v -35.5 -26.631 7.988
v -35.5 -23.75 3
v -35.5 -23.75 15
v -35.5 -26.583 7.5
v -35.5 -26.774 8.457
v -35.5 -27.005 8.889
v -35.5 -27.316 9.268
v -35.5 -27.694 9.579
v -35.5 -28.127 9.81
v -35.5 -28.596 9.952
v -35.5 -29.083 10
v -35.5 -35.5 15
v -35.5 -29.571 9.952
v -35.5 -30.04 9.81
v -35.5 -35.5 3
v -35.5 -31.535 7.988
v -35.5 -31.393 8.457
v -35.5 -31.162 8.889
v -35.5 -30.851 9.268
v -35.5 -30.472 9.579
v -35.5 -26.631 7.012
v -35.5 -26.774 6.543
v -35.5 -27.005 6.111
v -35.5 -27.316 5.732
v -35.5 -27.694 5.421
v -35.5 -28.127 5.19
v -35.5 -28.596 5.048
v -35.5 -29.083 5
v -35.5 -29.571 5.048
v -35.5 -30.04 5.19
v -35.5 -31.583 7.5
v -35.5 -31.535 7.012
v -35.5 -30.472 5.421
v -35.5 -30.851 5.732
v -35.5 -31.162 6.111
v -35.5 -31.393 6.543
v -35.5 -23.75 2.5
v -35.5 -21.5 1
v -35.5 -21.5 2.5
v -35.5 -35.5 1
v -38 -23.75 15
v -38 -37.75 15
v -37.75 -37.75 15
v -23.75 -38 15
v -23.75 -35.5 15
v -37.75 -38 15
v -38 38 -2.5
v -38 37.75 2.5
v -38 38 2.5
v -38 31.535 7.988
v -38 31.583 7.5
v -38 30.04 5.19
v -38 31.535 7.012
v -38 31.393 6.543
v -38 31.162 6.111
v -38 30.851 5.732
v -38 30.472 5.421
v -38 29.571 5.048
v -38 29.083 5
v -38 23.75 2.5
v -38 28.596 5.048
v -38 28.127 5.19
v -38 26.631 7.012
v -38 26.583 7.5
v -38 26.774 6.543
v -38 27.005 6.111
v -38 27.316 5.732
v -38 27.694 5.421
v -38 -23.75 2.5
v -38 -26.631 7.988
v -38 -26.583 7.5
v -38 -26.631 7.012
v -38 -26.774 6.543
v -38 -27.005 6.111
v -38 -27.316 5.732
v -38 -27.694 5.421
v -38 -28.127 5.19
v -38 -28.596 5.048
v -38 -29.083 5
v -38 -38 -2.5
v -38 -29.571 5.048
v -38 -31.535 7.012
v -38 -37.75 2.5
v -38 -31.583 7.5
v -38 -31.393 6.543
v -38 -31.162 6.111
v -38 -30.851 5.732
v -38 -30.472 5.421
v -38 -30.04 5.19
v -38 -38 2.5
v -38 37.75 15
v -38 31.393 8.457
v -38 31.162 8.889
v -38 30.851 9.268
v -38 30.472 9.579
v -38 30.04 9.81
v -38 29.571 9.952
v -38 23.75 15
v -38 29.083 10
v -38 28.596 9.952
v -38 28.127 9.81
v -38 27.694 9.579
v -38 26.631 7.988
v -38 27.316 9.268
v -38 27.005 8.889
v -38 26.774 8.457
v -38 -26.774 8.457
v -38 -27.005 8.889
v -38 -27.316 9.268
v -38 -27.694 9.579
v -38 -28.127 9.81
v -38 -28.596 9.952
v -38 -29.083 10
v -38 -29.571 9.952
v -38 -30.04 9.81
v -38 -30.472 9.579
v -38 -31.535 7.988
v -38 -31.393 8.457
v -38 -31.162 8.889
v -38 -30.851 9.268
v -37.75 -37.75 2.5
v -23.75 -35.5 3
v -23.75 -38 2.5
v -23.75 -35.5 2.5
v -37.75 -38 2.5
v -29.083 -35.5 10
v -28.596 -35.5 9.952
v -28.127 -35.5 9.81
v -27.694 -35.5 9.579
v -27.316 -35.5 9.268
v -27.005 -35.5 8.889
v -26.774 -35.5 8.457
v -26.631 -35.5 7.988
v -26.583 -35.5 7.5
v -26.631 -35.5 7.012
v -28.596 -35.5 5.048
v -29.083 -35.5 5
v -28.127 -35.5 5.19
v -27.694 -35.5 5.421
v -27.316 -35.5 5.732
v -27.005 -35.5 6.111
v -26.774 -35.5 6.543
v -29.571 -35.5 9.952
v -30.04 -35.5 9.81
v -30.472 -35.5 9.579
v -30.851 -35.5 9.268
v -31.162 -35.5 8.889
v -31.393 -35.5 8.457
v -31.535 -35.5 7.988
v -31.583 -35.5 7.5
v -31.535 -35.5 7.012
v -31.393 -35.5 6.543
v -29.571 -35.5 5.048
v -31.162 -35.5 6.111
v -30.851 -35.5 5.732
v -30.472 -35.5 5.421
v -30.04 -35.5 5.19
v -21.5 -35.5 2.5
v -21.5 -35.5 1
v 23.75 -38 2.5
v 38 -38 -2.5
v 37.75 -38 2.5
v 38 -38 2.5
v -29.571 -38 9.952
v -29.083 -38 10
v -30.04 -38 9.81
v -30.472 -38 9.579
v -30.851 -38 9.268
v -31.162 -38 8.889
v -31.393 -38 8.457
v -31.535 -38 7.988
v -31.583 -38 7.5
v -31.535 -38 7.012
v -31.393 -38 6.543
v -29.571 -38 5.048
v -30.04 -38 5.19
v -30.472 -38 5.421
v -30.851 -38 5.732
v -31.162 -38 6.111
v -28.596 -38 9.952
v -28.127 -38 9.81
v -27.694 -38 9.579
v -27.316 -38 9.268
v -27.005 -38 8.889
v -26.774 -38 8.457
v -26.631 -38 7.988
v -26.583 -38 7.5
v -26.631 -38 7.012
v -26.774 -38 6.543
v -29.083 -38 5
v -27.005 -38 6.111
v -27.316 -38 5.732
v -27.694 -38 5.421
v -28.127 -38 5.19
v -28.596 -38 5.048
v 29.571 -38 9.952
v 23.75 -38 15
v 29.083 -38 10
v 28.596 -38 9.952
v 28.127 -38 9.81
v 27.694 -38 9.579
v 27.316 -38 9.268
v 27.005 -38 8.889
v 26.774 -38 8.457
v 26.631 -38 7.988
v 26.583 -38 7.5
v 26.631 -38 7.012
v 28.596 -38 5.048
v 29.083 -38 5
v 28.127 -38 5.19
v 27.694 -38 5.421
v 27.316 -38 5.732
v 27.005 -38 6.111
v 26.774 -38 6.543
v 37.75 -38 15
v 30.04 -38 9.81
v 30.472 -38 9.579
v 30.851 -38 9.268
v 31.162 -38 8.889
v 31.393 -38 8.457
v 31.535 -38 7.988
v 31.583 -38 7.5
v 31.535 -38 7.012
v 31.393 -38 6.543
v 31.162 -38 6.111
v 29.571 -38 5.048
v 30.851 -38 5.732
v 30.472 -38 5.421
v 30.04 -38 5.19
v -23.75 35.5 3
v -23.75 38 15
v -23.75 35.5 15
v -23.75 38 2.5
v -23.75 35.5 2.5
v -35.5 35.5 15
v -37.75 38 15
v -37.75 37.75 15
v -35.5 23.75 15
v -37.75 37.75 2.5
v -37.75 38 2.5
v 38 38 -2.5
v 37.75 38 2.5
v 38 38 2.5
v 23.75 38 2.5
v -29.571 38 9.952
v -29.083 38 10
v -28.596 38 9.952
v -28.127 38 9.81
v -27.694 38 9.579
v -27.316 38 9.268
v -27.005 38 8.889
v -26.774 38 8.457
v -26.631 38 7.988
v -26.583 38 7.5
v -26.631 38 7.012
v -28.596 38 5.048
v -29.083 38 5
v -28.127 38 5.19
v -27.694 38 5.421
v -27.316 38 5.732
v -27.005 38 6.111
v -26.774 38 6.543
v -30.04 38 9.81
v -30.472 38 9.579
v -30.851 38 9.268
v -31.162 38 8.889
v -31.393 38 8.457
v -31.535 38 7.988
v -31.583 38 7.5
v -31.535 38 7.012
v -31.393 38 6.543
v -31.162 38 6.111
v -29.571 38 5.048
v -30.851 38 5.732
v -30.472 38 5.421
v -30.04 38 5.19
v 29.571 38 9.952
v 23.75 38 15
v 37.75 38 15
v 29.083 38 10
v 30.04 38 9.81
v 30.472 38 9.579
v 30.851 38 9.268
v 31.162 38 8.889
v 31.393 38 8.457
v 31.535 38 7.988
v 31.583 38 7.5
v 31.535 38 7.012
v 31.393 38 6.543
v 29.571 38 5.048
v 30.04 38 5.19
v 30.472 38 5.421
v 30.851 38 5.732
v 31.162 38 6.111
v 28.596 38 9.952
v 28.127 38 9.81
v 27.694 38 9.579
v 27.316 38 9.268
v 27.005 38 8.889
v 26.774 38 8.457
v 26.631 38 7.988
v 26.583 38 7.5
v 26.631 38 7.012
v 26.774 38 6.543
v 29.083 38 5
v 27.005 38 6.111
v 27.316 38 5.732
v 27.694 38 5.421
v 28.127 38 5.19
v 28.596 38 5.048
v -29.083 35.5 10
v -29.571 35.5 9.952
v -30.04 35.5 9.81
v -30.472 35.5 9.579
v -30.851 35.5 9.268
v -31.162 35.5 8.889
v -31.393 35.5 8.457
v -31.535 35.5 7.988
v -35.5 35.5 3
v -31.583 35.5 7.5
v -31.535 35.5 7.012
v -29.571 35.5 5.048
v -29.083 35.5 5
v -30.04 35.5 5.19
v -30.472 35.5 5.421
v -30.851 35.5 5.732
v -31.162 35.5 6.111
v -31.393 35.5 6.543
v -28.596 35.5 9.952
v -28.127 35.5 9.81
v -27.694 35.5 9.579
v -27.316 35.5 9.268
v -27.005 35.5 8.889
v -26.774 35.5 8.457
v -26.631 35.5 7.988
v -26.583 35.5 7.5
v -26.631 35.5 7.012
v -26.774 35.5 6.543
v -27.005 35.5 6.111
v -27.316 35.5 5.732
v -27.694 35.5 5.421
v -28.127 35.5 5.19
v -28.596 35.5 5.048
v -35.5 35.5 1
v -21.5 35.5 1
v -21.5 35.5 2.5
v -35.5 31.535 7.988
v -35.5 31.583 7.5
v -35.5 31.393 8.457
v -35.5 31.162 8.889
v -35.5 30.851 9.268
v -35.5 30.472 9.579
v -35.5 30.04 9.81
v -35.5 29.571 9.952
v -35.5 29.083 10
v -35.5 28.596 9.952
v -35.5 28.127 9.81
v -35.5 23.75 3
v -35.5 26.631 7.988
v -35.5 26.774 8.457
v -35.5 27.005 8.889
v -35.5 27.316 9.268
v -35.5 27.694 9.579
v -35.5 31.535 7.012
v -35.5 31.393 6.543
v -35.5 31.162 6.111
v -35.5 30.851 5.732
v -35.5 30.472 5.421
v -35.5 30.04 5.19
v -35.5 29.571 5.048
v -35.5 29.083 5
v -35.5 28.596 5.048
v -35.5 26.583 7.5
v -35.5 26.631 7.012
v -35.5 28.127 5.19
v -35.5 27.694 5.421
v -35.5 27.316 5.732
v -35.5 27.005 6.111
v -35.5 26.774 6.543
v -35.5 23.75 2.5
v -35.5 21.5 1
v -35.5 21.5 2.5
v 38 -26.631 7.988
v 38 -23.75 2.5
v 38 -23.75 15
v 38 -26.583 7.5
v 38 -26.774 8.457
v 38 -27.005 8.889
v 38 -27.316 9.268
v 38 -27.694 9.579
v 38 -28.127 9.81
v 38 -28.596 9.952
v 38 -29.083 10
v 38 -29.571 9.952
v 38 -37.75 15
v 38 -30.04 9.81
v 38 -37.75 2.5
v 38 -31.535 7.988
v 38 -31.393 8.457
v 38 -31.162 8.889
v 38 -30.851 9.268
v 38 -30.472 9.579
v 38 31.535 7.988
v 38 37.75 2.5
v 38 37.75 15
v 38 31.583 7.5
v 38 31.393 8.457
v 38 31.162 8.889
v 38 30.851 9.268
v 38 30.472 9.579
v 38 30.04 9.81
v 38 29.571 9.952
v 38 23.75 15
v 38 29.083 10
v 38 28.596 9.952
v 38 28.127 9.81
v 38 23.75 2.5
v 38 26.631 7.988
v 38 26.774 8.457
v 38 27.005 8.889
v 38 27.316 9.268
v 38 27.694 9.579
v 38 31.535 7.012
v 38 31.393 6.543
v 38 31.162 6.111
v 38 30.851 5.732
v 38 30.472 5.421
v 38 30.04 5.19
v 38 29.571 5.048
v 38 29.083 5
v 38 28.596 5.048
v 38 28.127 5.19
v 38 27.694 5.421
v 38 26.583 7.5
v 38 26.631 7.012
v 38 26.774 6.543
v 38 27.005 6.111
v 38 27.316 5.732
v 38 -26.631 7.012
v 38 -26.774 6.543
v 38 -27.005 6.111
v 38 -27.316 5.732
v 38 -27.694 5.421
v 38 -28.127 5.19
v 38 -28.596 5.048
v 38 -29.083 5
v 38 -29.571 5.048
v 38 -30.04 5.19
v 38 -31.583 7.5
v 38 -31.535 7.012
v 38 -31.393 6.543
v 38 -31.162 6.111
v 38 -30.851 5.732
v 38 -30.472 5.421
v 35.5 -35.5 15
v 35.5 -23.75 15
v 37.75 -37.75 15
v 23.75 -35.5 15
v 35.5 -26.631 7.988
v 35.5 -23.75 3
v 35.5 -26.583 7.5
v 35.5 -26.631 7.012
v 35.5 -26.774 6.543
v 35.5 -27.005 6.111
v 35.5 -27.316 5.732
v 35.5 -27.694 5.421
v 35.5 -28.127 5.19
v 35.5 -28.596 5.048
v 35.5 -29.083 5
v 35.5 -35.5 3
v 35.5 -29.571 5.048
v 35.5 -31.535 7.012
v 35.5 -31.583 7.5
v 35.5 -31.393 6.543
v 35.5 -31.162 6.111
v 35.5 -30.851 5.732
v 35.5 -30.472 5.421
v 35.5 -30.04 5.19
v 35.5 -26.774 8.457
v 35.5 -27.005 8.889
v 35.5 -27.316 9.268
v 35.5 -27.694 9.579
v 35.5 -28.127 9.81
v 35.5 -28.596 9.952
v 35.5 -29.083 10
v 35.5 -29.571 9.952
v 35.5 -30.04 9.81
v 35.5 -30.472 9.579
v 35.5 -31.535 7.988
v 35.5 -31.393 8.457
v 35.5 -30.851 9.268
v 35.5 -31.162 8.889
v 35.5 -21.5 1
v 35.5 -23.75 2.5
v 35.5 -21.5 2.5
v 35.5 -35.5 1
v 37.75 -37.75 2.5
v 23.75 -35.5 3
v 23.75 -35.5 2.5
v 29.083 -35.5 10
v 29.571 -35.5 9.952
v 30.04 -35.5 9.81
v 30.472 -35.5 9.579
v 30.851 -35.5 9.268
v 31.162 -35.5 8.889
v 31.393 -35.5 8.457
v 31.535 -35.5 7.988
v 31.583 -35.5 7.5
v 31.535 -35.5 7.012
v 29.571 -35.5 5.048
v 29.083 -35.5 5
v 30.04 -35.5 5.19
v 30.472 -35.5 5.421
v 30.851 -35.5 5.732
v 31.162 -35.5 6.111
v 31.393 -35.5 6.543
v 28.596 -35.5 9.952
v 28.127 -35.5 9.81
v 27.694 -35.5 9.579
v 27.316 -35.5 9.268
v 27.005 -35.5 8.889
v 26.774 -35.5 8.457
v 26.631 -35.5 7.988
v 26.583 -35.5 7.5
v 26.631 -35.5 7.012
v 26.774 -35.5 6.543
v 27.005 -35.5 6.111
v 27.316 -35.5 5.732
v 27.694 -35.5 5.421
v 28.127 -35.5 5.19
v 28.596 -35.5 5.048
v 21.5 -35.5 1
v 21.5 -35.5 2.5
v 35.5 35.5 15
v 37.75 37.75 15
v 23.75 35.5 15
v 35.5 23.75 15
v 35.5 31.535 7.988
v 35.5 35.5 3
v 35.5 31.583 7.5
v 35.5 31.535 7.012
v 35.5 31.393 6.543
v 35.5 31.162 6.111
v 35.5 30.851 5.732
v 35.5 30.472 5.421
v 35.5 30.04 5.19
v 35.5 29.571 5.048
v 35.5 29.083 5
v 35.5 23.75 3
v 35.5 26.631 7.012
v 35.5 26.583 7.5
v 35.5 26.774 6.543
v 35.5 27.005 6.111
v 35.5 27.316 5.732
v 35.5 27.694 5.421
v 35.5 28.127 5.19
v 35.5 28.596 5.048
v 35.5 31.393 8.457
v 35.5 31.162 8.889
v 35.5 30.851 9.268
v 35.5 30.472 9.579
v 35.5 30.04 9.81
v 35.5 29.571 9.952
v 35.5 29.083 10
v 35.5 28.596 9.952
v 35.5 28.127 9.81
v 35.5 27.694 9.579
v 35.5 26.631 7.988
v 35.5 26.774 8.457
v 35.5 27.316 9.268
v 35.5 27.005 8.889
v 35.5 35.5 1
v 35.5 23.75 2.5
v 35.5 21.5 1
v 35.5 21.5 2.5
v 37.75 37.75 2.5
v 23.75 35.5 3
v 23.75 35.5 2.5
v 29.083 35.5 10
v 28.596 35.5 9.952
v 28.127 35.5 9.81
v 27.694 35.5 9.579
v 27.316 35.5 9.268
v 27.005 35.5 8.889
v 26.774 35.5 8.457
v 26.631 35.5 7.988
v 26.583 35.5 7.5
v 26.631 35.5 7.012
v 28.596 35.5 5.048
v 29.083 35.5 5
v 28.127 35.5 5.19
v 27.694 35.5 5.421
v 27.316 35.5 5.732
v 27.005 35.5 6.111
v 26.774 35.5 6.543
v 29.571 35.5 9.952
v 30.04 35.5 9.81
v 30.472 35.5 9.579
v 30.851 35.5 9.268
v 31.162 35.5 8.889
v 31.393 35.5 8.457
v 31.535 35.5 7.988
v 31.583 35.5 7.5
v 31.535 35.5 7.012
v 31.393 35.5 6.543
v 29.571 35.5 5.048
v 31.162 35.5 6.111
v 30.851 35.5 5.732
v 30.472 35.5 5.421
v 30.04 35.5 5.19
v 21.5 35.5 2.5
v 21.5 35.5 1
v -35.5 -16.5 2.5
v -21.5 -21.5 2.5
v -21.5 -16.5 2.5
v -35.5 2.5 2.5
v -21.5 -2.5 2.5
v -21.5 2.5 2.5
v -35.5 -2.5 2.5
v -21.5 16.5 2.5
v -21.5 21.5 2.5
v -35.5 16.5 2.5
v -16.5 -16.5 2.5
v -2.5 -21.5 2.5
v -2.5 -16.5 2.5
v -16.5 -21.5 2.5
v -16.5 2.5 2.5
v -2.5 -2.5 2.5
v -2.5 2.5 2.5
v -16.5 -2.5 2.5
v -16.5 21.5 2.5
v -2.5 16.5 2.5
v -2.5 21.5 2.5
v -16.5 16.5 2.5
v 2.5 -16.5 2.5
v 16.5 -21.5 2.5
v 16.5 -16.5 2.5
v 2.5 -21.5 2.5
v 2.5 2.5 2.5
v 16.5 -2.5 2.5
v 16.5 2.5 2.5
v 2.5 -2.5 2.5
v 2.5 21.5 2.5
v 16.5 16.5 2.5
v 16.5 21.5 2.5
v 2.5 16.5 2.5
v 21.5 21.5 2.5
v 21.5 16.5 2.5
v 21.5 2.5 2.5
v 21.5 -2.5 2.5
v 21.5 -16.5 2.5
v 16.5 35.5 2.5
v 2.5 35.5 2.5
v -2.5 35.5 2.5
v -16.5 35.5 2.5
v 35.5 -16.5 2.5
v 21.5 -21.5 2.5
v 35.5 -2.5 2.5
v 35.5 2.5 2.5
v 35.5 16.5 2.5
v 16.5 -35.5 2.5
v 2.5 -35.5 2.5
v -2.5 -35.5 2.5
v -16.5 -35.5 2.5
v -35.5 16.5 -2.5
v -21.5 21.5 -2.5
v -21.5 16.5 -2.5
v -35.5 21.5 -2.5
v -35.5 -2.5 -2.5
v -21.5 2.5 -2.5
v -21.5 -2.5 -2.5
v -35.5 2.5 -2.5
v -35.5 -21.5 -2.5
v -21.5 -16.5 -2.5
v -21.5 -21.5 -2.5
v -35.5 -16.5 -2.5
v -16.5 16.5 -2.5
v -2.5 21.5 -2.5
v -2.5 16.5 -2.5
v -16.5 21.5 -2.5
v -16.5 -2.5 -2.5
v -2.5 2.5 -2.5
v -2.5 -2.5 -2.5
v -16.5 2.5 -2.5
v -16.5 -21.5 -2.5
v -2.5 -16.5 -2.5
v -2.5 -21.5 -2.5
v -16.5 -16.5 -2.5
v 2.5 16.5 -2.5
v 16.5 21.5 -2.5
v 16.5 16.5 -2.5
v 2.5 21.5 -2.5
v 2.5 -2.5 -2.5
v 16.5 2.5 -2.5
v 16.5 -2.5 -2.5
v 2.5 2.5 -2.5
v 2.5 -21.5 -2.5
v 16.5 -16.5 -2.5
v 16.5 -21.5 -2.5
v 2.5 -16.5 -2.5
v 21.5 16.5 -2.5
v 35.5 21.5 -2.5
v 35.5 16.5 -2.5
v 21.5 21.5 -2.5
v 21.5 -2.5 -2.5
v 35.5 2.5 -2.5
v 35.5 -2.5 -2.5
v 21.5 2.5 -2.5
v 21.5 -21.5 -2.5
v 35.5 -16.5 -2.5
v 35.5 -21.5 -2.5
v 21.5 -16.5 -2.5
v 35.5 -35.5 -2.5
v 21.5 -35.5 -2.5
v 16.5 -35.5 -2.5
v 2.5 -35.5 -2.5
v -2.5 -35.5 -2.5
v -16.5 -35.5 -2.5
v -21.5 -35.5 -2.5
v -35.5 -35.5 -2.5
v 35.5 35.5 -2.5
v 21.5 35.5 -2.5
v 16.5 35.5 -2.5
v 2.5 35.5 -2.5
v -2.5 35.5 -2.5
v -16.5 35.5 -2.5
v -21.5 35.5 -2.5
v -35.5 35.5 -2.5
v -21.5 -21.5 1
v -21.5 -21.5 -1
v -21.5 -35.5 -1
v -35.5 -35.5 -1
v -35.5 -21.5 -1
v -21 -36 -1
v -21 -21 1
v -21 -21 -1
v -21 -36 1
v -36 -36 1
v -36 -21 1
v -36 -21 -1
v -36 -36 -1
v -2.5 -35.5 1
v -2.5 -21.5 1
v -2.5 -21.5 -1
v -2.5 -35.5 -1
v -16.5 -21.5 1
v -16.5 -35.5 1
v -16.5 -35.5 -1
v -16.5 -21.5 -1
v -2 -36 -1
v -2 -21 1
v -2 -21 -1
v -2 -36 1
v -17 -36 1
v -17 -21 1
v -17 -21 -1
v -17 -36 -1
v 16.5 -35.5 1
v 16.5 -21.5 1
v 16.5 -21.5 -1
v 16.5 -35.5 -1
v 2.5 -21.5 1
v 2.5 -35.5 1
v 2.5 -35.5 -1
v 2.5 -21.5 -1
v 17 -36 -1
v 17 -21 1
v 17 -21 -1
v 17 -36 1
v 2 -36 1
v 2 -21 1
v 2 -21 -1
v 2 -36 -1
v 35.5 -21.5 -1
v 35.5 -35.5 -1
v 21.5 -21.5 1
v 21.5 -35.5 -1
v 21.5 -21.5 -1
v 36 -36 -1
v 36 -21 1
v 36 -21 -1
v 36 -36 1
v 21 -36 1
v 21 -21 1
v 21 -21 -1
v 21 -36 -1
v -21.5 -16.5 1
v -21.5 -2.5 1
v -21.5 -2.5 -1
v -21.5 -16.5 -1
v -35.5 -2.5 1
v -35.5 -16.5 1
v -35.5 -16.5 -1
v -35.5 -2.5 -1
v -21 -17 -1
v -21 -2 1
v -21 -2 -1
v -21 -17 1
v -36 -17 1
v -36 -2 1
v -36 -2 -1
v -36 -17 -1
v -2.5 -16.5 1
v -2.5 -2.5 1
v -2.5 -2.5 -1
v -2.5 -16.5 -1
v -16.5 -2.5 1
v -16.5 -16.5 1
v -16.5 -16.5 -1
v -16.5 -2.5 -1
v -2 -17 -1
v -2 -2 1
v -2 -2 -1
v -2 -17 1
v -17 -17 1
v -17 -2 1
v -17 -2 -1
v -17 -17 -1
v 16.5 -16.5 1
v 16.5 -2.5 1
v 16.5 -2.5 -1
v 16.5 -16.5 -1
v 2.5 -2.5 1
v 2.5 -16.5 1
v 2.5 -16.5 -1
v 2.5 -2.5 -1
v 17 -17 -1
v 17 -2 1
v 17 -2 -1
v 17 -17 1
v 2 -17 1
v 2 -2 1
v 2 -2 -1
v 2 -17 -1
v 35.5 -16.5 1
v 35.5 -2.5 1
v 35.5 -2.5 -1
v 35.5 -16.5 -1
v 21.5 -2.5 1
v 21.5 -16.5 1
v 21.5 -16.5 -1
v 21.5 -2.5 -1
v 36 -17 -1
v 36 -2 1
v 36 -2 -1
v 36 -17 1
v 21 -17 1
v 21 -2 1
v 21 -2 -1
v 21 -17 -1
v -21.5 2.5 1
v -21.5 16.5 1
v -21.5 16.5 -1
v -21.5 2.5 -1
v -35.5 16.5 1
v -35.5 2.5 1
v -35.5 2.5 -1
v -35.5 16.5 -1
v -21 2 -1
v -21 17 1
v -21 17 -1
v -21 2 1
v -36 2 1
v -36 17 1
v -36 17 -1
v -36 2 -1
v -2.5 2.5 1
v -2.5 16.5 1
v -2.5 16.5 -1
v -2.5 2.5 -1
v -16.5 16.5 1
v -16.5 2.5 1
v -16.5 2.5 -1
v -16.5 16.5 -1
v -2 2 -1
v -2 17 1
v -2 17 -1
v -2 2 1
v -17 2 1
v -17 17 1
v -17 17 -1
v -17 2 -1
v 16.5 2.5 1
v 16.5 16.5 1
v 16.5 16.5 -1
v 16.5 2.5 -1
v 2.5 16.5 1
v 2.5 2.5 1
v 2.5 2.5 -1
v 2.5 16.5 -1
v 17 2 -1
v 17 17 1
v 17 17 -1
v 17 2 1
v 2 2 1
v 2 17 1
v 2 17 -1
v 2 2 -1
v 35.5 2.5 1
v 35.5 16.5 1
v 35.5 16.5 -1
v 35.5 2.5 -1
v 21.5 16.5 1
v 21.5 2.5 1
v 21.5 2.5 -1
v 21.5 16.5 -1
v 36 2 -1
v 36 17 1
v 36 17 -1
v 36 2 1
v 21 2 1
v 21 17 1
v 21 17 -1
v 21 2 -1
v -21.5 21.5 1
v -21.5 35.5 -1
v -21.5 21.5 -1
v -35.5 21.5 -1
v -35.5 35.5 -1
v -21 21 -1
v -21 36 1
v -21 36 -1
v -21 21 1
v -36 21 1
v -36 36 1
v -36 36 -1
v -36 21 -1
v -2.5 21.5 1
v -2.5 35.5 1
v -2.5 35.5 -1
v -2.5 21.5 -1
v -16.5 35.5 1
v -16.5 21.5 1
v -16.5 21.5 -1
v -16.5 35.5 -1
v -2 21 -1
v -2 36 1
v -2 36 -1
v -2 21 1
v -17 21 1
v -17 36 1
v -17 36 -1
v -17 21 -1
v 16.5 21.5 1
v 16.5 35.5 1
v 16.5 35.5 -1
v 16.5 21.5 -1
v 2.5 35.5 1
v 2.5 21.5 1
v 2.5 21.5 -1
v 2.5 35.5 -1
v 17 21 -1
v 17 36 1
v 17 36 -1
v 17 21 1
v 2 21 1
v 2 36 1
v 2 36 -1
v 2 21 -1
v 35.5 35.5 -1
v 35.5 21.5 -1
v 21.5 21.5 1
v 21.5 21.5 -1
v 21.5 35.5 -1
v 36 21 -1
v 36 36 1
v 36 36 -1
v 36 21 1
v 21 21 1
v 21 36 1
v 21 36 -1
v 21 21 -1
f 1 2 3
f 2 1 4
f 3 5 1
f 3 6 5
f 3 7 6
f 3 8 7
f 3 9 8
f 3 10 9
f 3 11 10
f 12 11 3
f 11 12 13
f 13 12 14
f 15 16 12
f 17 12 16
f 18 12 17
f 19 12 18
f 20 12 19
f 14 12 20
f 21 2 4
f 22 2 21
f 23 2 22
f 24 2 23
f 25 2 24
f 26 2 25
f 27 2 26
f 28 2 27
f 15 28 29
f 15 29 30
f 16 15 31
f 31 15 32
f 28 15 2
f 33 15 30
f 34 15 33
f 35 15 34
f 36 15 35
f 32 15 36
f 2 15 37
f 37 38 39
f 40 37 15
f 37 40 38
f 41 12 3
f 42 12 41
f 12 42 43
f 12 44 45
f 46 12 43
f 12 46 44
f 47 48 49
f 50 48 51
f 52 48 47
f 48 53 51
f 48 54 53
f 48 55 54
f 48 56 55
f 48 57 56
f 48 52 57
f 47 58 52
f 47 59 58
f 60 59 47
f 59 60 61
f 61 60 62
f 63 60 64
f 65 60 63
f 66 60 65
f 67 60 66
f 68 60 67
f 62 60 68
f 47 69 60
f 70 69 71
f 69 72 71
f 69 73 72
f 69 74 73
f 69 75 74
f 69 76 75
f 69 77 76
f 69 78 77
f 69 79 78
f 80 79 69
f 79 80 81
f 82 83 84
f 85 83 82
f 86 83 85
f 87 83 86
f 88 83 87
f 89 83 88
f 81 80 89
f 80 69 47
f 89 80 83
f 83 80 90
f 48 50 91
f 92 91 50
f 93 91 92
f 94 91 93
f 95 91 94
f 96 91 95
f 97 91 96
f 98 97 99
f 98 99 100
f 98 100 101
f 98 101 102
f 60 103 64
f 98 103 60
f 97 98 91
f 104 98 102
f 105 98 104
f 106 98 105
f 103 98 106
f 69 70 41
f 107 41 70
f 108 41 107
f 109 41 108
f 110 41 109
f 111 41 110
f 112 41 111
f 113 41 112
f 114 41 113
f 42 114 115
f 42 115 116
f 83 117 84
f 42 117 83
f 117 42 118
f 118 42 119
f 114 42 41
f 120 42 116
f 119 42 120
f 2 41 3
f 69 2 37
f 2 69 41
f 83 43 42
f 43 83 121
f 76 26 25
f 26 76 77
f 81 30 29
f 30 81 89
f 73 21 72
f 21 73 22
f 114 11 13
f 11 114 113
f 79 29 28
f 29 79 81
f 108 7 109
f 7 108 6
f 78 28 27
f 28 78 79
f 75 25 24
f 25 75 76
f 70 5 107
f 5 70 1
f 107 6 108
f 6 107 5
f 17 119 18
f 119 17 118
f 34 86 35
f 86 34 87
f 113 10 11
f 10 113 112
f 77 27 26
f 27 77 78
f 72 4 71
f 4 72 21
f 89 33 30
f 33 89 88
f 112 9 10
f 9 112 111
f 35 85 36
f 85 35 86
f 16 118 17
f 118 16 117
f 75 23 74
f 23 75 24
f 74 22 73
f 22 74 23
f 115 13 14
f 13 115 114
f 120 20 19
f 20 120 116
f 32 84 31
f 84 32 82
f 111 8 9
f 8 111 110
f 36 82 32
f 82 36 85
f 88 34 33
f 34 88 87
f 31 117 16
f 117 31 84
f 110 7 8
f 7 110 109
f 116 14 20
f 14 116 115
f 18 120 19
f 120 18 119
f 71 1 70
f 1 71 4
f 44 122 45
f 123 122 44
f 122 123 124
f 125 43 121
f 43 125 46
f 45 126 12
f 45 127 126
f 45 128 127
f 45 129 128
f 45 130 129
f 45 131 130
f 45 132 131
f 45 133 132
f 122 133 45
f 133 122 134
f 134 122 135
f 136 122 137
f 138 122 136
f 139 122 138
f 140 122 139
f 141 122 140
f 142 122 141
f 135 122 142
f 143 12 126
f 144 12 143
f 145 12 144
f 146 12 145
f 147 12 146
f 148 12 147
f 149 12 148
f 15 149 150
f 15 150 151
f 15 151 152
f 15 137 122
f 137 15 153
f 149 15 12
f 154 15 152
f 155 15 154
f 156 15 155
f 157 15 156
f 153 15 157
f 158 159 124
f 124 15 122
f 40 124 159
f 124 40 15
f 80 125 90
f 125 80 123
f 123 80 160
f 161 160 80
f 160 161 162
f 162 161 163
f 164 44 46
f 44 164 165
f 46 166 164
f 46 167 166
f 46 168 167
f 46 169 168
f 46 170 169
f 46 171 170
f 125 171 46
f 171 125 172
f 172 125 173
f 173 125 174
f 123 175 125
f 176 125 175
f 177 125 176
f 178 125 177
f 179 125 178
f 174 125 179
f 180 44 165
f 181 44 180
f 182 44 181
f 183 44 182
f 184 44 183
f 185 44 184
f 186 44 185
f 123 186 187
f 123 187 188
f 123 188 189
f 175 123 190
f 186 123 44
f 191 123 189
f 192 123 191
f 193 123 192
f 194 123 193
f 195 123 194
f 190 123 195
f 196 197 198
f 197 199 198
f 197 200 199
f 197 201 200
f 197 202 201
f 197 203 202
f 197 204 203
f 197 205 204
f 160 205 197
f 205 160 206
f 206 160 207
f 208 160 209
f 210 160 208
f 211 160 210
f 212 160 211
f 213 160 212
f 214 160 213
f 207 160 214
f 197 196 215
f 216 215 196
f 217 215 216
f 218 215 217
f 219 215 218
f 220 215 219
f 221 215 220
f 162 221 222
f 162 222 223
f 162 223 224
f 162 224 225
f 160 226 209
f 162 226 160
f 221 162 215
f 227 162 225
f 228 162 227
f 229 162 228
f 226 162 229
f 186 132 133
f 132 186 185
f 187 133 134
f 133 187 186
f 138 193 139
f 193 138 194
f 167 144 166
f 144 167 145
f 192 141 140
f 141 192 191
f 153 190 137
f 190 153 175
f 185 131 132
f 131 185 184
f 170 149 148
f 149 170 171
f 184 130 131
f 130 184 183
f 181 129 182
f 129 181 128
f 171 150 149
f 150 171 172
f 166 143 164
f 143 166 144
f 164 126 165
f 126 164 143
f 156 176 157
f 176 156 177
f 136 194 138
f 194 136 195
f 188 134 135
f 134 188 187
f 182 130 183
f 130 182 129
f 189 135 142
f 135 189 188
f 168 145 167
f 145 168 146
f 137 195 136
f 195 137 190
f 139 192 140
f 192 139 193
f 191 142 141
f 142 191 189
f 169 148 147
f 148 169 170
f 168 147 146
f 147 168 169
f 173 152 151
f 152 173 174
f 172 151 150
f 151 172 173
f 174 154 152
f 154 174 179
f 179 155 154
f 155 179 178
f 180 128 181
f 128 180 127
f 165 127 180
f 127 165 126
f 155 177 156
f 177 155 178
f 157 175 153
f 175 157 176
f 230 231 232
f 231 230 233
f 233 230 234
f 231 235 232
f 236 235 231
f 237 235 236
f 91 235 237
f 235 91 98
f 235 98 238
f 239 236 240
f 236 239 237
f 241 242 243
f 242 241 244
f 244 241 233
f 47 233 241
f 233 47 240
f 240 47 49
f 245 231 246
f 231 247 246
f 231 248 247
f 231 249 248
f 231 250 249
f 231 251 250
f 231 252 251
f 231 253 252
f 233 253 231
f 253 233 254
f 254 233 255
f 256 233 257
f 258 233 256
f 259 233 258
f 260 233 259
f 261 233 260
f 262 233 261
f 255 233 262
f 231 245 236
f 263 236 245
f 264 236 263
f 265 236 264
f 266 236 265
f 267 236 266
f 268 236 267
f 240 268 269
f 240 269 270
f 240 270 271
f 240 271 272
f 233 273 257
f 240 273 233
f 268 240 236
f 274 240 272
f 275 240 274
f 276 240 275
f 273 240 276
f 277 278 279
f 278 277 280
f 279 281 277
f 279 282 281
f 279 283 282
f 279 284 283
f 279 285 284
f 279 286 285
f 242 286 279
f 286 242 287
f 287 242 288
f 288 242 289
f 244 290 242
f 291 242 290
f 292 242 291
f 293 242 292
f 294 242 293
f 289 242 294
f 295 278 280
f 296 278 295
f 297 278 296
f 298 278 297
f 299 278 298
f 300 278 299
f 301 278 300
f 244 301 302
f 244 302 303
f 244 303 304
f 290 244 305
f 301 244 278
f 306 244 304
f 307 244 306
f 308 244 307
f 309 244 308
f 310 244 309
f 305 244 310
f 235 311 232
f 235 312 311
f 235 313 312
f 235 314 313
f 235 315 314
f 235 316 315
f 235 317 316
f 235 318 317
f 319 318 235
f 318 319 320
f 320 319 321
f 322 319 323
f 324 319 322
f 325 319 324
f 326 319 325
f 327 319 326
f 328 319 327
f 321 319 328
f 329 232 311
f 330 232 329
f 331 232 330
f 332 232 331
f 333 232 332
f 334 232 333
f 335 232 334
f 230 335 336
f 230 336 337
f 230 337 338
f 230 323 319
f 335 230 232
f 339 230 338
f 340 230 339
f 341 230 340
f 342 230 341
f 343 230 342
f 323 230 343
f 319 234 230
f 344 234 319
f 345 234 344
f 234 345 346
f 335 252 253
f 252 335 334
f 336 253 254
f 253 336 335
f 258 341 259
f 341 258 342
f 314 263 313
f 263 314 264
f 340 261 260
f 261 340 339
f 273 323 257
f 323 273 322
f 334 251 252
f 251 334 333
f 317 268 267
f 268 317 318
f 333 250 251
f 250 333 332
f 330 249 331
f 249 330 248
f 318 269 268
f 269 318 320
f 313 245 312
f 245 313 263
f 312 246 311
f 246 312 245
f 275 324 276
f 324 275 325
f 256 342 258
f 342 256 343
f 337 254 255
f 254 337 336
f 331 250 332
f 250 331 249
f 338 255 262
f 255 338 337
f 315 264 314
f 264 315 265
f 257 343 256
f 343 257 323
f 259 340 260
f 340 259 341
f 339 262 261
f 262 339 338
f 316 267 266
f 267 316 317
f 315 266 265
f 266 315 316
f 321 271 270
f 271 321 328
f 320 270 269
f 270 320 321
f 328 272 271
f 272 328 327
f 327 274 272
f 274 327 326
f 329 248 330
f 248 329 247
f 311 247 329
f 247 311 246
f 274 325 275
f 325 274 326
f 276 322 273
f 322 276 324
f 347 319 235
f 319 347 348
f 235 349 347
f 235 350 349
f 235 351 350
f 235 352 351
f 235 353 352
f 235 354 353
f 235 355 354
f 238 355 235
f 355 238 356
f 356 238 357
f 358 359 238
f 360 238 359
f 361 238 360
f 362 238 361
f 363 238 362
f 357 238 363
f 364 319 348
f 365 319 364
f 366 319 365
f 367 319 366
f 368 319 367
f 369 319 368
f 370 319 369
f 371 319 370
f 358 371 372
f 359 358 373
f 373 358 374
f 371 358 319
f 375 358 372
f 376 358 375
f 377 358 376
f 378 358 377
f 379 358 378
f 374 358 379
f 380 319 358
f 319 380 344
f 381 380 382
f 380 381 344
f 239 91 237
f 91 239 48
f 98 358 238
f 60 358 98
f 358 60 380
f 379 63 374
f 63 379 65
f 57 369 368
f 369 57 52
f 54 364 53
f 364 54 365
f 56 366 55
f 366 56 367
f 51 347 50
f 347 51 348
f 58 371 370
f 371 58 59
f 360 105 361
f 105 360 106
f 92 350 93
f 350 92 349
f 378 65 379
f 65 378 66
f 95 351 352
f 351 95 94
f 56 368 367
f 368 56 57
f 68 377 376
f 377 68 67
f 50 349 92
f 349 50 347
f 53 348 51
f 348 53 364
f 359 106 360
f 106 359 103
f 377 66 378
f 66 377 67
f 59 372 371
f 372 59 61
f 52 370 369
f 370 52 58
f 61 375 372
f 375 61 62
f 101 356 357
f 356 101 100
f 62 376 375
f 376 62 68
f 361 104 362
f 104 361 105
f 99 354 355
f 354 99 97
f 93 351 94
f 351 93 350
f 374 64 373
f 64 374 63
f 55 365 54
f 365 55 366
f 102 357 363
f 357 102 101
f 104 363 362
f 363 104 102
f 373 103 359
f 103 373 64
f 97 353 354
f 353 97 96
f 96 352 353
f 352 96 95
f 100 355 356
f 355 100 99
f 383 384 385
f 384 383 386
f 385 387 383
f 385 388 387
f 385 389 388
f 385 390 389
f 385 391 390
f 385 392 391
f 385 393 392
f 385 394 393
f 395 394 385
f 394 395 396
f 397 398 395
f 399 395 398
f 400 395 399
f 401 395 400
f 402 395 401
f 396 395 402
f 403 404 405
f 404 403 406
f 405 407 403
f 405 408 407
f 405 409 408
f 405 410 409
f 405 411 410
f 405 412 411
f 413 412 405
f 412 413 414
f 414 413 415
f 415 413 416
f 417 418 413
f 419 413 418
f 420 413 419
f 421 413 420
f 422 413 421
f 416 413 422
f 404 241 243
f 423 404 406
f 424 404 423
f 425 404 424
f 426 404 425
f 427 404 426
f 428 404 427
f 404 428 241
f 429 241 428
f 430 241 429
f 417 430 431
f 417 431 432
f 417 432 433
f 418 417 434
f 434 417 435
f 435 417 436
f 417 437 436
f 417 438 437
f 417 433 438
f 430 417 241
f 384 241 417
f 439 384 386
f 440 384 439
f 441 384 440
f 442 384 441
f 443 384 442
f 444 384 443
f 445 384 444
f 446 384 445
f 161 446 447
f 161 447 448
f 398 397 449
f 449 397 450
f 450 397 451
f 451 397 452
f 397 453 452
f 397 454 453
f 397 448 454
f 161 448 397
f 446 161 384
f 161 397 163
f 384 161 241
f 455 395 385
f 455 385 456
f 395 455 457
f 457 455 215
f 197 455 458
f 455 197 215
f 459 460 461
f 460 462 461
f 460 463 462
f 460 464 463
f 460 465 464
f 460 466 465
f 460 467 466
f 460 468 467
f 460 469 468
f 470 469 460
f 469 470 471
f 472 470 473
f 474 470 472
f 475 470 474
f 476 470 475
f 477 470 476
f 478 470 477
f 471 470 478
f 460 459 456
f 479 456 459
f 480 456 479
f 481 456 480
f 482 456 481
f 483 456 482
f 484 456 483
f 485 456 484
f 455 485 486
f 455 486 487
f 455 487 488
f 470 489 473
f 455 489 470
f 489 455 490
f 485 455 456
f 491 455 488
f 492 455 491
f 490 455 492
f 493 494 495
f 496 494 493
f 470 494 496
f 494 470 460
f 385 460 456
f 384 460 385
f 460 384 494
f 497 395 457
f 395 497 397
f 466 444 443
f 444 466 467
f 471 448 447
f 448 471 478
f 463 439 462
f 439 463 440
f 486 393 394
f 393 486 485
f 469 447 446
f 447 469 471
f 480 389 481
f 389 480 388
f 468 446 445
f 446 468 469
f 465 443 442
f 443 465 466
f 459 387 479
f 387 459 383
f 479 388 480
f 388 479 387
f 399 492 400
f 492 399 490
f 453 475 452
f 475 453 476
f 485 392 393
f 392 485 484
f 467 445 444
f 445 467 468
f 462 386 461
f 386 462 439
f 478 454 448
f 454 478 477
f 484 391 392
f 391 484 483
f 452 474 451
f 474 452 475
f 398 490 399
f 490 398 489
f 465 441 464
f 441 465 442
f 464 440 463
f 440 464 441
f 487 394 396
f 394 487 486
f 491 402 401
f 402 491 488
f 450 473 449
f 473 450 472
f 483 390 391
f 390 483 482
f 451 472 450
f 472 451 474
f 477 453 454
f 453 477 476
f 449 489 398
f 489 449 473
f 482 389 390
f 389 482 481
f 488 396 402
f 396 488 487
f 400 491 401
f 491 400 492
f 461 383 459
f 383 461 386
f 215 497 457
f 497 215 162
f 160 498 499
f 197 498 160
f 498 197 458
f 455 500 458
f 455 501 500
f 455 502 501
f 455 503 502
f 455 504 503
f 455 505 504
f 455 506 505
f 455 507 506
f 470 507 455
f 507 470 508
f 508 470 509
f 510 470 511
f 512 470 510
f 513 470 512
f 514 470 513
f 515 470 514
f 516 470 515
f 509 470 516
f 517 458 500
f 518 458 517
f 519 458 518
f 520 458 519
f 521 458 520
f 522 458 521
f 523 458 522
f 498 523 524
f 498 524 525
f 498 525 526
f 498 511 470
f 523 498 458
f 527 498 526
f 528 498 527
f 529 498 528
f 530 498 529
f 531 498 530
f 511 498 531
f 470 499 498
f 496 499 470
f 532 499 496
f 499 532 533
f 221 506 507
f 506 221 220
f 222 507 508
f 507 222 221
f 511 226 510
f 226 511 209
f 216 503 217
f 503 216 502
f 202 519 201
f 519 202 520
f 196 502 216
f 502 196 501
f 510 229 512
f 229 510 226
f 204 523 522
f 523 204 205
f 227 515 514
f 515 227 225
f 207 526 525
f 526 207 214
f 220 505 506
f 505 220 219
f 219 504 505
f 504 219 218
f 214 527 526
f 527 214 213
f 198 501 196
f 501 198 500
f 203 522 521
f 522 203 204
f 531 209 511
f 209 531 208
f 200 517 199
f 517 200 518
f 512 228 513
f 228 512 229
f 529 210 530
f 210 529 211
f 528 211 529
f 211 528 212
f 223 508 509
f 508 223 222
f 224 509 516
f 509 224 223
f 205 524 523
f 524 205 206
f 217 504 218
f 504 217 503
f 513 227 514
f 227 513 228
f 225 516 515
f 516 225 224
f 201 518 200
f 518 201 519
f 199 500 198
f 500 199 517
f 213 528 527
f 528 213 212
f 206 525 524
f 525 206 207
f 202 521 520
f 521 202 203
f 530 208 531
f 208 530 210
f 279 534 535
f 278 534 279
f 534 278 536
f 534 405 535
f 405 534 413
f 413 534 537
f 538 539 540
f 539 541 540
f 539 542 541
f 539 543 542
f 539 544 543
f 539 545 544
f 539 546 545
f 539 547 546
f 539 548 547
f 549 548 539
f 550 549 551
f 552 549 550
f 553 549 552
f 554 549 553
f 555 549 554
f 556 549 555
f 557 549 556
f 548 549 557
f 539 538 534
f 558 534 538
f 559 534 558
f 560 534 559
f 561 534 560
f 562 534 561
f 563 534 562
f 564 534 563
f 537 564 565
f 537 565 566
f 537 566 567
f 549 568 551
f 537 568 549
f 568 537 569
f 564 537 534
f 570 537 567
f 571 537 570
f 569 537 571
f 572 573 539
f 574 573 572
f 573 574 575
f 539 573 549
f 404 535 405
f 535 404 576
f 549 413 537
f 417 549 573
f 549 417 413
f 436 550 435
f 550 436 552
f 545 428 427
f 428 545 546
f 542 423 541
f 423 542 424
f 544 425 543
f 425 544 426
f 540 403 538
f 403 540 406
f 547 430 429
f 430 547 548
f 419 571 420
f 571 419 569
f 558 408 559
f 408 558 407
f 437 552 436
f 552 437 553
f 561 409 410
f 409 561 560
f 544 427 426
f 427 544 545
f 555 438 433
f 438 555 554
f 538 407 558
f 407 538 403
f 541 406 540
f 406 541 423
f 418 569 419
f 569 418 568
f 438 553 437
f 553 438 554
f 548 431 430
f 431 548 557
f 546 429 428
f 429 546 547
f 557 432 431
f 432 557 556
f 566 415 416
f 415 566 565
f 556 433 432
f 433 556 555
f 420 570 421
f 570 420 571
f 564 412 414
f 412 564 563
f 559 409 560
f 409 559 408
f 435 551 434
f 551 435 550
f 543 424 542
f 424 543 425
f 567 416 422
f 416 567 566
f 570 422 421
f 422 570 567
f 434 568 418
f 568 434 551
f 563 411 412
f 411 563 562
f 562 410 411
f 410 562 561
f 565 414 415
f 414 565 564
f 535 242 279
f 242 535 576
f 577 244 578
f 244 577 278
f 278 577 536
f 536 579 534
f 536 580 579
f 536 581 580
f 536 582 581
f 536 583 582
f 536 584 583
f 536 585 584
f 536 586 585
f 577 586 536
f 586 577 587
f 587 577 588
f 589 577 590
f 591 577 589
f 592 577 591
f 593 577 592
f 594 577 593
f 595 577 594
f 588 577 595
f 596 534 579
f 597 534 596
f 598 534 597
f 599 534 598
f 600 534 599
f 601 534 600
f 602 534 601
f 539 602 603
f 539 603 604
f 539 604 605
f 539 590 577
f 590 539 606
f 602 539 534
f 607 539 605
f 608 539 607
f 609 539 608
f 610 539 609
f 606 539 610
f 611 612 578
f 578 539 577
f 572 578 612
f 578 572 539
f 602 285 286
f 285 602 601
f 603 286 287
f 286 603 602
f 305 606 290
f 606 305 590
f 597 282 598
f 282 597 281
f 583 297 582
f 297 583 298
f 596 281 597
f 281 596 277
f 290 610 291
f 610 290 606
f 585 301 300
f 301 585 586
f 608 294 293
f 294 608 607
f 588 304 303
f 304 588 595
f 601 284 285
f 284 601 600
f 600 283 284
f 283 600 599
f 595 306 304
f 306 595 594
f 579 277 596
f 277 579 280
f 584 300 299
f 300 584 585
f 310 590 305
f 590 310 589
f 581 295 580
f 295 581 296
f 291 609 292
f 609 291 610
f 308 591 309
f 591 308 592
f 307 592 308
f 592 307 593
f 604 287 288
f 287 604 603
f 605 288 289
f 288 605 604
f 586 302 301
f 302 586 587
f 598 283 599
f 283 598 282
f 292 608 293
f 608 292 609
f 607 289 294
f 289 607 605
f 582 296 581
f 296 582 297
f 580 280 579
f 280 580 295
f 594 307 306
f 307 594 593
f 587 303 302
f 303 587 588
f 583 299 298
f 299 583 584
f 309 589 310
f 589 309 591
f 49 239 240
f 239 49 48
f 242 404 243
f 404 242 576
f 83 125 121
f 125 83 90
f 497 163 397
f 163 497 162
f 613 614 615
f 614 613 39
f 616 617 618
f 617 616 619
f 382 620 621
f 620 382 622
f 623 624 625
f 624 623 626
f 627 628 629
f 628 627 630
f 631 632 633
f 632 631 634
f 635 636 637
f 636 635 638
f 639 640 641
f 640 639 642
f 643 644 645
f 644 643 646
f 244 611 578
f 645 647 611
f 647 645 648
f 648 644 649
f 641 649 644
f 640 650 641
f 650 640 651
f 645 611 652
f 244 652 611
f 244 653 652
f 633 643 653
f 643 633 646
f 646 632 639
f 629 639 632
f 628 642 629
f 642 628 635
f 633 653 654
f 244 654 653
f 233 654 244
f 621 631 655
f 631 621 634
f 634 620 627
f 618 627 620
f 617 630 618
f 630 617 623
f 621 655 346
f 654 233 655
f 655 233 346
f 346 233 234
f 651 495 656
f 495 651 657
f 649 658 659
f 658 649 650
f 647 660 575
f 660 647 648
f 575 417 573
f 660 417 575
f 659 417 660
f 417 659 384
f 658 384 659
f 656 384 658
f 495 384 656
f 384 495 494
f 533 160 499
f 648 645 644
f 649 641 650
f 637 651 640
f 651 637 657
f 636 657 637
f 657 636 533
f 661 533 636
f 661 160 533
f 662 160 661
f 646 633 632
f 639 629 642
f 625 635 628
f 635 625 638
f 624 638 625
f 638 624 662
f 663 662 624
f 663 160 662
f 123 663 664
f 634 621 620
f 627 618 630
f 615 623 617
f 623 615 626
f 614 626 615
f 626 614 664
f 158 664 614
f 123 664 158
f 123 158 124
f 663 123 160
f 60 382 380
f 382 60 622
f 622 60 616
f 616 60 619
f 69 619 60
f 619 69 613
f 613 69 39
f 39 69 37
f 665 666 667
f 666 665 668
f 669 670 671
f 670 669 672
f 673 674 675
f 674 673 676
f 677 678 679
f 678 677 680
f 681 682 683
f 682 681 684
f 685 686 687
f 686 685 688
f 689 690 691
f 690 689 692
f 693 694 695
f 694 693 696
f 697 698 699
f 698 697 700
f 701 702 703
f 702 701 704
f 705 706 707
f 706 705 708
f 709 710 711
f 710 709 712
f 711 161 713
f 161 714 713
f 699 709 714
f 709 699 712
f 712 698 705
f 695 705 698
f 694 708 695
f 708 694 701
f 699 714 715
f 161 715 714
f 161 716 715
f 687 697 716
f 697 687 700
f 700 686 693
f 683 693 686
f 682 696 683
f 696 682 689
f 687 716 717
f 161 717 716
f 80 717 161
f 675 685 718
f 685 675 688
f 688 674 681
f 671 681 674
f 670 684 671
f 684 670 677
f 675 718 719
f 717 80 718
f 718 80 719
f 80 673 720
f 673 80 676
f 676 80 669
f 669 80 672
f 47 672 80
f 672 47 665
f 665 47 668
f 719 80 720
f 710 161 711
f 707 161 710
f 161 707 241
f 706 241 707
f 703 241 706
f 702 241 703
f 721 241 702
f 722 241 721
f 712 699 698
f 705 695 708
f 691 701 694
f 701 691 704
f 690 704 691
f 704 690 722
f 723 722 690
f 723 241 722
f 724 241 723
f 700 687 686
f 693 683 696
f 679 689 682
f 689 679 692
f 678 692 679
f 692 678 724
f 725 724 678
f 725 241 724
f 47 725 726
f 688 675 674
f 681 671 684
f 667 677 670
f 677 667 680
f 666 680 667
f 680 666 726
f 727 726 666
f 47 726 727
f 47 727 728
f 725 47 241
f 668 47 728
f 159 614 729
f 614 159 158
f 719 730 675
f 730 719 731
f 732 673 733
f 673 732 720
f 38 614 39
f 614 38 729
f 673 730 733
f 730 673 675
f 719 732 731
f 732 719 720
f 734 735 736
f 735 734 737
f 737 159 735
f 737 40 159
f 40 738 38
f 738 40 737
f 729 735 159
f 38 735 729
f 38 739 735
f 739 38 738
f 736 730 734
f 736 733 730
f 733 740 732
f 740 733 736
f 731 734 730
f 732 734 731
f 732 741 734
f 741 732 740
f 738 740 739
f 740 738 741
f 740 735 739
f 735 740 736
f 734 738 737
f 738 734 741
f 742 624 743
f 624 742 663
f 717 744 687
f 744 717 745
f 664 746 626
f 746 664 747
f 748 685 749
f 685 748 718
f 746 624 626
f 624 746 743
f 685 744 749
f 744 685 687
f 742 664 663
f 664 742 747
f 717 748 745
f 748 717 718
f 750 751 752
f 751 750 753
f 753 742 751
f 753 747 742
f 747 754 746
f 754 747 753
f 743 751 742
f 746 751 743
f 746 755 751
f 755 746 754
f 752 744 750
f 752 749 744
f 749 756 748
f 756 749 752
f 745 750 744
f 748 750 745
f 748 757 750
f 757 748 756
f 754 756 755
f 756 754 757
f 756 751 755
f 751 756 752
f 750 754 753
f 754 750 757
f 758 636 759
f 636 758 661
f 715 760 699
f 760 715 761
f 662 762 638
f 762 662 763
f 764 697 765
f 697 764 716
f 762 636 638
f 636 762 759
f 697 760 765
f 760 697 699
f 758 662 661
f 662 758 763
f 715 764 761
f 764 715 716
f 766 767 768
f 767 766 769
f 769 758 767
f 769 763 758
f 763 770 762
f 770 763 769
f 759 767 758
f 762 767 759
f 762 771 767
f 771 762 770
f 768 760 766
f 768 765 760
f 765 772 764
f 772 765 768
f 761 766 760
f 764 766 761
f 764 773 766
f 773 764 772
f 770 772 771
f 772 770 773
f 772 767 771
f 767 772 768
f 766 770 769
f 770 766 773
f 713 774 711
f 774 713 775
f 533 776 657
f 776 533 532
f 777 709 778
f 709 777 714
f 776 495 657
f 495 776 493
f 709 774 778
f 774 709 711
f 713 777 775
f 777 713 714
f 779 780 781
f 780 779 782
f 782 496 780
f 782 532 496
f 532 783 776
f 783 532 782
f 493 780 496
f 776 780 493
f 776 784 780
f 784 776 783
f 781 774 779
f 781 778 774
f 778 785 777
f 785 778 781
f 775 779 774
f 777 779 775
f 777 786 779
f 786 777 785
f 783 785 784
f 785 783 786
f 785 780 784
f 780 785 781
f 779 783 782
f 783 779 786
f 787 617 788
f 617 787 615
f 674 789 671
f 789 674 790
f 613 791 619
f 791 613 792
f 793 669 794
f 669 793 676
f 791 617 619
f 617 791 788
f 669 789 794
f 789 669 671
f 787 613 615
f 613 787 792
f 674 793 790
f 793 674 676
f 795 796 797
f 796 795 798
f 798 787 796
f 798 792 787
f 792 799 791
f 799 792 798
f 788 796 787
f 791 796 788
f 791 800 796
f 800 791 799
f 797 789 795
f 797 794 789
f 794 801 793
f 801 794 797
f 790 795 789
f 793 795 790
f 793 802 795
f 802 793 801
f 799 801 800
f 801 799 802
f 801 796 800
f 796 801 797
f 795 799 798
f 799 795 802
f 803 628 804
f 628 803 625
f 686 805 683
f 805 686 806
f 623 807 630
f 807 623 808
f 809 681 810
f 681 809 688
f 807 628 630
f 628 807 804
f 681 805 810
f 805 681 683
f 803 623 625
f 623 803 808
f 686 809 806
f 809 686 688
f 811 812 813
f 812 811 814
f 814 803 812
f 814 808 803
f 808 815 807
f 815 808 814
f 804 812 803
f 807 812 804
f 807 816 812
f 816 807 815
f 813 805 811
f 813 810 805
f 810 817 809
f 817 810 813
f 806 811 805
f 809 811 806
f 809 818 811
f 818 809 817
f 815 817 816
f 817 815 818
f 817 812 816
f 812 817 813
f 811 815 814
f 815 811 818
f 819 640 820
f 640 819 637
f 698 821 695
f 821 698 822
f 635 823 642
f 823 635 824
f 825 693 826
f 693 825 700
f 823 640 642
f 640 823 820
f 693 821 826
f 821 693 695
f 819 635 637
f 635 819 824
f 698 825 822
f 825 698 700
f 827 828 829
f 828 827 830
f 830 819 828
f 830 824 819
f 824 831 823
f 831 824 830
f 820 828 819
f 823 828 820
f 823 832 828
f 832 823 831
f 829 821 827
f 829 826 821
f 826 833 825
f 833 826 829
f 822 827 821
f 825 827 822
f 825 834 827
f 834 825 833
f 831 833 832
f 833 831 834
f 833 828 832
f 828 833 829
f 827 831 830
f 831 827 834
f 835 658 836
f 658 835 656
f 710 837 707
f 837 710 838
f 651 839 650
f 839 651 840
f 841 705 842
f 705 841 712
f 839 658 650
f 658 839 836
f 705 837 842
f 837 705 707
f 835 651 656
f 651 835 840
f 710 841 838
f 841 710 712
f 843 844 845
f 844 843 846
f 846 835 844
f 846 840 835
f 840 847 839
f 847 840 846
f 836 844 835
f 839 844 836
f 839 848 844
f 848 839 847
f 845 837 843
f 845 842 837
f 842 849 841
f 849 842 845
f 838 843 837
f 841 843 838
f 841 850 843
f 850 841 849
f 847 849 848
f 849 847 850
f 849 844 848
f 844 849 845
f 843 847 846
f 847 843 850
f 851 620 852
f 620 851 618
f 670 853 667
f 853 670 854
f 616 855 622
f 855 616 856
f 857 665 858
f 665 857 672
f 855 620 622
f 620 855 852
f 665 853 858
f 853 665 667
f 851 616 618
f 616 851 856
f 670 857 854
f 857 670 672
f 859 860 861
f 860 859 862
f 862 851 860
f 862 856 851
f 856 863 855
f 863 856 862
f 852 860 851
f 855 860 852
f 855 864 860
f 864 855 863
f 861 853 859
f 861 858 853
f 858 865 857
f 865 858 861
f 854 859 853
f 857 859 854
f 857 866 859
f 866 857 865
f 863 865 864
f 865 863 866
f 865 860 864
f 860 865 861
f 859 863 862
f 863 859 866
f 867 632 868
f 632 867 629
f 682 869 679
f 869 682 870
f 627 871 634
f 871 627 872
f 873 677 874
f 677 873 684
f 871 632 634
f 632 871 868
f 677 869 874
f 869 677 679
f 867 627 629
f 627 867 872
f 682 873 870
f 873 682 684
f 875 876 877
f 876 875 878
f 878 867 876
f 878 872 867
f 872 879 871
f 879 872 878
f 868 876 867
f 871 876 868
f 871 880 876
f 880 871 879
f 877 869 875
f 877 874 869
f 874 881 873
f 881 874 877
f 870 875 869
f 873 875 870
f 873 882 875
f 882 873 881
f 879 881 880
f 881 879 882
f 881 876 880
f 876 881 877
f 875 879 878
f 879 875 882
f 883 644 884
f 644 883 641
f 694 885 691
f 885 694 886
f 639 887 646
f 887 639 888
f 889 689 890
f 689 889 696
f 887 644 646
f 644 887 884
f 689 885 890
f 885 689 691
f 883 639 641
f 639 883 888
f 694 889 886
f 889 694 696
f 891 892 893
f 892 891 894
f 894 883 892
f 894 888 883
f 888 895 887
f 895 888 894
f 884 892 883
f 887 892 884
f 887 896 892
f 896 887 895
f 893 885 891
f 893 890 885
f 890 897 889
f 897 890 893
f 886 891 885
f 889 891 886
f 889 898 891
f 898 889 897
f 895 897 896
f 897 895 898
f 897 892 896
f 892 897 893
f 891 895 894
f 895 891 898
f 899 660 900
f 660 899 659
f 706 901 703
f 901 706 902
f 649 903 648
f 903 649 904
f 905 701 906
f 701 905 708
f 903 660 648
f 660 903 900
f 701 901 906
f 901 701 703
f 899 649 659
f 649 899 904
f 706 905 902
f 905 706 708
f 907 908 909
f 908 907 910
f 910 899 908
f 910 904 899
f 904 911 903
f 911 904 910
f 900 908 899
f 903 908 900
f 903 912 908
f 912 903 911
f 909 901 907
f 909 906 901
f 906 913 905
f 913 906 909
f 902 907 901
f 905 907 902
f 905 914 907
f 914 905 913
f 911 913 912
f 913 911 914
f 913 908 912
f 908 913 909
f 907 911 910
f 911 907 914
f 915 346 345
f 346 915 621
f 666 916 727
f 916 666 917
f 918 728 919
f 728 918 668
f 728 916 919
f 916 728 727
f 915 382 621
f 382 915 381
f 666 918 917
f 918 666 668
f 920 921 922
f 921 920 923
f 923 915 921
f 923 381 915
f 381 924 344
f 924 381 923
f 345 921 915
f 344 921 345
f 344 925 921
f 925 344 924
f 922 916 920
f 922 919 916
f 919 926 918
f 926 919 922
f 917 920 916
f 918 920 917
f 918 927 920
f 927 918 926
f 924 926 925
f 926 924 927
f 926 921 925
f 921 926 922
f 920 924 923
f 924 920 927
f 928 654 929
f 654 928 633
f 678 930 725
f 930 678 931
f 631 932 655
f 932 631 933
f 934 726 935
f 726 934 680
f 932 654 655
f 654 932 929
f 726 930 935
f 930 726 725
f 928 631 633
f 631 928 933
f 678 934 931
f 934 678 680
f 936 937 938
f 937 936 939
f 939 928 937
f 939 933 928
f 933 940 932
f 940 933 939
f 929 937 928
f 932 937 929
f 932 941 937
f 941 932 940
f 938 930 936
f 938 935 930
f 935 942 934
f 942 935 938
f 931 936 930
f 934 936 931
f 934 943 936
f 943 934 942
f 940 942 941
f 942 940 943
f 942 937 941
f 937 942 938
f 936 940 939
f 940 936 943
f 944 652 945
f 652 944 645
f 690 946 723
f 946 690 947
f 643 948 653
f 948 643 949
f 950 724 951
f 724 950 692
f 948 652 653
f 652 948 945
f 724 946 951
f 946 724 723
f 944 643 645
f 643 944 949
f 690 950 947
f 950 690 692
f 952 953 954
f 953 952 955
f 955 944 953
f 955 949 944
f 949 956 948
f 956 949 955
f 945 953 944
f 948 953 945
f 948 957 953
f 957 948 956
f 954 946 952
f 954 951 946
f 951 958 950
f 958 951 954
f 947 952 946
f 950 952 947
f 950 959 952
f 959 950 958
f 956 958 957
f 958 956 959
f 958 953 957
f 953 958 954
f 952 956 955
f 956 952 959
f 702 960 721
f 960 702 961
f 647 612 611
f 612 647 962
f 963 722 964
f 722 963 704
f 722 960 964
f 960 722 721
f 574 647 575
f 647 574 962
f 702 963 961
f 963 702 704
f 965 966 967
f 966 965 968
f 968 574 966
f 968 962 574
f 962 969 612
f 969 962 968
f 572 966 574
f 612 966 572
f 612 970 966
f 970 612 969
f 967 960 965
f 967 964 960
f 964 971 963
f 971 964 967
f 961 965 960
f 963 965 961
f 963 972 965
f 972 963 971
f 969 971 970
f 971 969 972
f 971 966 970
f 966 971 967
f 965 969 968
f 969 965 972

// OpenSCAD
keys_x = 4;
keys_y = 4;

key_size = 14;
inter_key = 5;

cell_size = key_size + inter_key;
plat_x = keys_x * cell_size;
plat_y = keys_y * cell_size;

difference() {
  union() {
    cube([plat_x, plat_y, 5], center = true);
    for (x = [-1, 1]) {
      for (y = [-1, 1]) {
        translate([x*(plat_x-inter_key/2)/2, y*(plat_y-inter_key/2)/2, inter_key*1.5]) {
          translate([0, -y*(inter_key+1), 0]) {
            difference() {
              cube([inter_key/2, 3*inter_key-1, inter_key*3], center = true);
              translate([0, -y*inter_key/3, 0]) {
                rotate([0, 90, 0]) {
                  cylinder(h=inter_key, r=inter_key/2, center = true, $fn=32);
                }
              }
            }
          }
          translate([-x*(inter_key+1), 0, 0]) {
            difference() {
              cube([3*inter_key-1, inter_key/2, inter_key*3], center = true);
              translate([-x*inter_key/3, 0, 0]) {
                rotate([90, 0, 0]) {
                  cylinder(h=inter_key, r=inter_key/2, center = true, $fn=32);
                }
              }
            }
          }
        }
      }
    }
  }
  for (yk = [0:(keys_y - 1)]) {
    translate([-cell_size*(keys_x - 1)/2, -cell_size*(keys_y - 1)/2 + cell_size * yk, 0]) {
      for (xk = [0:(keys_x - 1)]) {
        translate([cell_size * xk, 0, 0]) {
          cube([key_size, key_size, 6], center = true);
          cube([key_size + 1, key_size + 1, 2], center = true);
        }
      }
    }
  }
}
        


//TODO: consider a snap-in ring around the inside of the insert
//TODO: 4x4, 19mm on center
